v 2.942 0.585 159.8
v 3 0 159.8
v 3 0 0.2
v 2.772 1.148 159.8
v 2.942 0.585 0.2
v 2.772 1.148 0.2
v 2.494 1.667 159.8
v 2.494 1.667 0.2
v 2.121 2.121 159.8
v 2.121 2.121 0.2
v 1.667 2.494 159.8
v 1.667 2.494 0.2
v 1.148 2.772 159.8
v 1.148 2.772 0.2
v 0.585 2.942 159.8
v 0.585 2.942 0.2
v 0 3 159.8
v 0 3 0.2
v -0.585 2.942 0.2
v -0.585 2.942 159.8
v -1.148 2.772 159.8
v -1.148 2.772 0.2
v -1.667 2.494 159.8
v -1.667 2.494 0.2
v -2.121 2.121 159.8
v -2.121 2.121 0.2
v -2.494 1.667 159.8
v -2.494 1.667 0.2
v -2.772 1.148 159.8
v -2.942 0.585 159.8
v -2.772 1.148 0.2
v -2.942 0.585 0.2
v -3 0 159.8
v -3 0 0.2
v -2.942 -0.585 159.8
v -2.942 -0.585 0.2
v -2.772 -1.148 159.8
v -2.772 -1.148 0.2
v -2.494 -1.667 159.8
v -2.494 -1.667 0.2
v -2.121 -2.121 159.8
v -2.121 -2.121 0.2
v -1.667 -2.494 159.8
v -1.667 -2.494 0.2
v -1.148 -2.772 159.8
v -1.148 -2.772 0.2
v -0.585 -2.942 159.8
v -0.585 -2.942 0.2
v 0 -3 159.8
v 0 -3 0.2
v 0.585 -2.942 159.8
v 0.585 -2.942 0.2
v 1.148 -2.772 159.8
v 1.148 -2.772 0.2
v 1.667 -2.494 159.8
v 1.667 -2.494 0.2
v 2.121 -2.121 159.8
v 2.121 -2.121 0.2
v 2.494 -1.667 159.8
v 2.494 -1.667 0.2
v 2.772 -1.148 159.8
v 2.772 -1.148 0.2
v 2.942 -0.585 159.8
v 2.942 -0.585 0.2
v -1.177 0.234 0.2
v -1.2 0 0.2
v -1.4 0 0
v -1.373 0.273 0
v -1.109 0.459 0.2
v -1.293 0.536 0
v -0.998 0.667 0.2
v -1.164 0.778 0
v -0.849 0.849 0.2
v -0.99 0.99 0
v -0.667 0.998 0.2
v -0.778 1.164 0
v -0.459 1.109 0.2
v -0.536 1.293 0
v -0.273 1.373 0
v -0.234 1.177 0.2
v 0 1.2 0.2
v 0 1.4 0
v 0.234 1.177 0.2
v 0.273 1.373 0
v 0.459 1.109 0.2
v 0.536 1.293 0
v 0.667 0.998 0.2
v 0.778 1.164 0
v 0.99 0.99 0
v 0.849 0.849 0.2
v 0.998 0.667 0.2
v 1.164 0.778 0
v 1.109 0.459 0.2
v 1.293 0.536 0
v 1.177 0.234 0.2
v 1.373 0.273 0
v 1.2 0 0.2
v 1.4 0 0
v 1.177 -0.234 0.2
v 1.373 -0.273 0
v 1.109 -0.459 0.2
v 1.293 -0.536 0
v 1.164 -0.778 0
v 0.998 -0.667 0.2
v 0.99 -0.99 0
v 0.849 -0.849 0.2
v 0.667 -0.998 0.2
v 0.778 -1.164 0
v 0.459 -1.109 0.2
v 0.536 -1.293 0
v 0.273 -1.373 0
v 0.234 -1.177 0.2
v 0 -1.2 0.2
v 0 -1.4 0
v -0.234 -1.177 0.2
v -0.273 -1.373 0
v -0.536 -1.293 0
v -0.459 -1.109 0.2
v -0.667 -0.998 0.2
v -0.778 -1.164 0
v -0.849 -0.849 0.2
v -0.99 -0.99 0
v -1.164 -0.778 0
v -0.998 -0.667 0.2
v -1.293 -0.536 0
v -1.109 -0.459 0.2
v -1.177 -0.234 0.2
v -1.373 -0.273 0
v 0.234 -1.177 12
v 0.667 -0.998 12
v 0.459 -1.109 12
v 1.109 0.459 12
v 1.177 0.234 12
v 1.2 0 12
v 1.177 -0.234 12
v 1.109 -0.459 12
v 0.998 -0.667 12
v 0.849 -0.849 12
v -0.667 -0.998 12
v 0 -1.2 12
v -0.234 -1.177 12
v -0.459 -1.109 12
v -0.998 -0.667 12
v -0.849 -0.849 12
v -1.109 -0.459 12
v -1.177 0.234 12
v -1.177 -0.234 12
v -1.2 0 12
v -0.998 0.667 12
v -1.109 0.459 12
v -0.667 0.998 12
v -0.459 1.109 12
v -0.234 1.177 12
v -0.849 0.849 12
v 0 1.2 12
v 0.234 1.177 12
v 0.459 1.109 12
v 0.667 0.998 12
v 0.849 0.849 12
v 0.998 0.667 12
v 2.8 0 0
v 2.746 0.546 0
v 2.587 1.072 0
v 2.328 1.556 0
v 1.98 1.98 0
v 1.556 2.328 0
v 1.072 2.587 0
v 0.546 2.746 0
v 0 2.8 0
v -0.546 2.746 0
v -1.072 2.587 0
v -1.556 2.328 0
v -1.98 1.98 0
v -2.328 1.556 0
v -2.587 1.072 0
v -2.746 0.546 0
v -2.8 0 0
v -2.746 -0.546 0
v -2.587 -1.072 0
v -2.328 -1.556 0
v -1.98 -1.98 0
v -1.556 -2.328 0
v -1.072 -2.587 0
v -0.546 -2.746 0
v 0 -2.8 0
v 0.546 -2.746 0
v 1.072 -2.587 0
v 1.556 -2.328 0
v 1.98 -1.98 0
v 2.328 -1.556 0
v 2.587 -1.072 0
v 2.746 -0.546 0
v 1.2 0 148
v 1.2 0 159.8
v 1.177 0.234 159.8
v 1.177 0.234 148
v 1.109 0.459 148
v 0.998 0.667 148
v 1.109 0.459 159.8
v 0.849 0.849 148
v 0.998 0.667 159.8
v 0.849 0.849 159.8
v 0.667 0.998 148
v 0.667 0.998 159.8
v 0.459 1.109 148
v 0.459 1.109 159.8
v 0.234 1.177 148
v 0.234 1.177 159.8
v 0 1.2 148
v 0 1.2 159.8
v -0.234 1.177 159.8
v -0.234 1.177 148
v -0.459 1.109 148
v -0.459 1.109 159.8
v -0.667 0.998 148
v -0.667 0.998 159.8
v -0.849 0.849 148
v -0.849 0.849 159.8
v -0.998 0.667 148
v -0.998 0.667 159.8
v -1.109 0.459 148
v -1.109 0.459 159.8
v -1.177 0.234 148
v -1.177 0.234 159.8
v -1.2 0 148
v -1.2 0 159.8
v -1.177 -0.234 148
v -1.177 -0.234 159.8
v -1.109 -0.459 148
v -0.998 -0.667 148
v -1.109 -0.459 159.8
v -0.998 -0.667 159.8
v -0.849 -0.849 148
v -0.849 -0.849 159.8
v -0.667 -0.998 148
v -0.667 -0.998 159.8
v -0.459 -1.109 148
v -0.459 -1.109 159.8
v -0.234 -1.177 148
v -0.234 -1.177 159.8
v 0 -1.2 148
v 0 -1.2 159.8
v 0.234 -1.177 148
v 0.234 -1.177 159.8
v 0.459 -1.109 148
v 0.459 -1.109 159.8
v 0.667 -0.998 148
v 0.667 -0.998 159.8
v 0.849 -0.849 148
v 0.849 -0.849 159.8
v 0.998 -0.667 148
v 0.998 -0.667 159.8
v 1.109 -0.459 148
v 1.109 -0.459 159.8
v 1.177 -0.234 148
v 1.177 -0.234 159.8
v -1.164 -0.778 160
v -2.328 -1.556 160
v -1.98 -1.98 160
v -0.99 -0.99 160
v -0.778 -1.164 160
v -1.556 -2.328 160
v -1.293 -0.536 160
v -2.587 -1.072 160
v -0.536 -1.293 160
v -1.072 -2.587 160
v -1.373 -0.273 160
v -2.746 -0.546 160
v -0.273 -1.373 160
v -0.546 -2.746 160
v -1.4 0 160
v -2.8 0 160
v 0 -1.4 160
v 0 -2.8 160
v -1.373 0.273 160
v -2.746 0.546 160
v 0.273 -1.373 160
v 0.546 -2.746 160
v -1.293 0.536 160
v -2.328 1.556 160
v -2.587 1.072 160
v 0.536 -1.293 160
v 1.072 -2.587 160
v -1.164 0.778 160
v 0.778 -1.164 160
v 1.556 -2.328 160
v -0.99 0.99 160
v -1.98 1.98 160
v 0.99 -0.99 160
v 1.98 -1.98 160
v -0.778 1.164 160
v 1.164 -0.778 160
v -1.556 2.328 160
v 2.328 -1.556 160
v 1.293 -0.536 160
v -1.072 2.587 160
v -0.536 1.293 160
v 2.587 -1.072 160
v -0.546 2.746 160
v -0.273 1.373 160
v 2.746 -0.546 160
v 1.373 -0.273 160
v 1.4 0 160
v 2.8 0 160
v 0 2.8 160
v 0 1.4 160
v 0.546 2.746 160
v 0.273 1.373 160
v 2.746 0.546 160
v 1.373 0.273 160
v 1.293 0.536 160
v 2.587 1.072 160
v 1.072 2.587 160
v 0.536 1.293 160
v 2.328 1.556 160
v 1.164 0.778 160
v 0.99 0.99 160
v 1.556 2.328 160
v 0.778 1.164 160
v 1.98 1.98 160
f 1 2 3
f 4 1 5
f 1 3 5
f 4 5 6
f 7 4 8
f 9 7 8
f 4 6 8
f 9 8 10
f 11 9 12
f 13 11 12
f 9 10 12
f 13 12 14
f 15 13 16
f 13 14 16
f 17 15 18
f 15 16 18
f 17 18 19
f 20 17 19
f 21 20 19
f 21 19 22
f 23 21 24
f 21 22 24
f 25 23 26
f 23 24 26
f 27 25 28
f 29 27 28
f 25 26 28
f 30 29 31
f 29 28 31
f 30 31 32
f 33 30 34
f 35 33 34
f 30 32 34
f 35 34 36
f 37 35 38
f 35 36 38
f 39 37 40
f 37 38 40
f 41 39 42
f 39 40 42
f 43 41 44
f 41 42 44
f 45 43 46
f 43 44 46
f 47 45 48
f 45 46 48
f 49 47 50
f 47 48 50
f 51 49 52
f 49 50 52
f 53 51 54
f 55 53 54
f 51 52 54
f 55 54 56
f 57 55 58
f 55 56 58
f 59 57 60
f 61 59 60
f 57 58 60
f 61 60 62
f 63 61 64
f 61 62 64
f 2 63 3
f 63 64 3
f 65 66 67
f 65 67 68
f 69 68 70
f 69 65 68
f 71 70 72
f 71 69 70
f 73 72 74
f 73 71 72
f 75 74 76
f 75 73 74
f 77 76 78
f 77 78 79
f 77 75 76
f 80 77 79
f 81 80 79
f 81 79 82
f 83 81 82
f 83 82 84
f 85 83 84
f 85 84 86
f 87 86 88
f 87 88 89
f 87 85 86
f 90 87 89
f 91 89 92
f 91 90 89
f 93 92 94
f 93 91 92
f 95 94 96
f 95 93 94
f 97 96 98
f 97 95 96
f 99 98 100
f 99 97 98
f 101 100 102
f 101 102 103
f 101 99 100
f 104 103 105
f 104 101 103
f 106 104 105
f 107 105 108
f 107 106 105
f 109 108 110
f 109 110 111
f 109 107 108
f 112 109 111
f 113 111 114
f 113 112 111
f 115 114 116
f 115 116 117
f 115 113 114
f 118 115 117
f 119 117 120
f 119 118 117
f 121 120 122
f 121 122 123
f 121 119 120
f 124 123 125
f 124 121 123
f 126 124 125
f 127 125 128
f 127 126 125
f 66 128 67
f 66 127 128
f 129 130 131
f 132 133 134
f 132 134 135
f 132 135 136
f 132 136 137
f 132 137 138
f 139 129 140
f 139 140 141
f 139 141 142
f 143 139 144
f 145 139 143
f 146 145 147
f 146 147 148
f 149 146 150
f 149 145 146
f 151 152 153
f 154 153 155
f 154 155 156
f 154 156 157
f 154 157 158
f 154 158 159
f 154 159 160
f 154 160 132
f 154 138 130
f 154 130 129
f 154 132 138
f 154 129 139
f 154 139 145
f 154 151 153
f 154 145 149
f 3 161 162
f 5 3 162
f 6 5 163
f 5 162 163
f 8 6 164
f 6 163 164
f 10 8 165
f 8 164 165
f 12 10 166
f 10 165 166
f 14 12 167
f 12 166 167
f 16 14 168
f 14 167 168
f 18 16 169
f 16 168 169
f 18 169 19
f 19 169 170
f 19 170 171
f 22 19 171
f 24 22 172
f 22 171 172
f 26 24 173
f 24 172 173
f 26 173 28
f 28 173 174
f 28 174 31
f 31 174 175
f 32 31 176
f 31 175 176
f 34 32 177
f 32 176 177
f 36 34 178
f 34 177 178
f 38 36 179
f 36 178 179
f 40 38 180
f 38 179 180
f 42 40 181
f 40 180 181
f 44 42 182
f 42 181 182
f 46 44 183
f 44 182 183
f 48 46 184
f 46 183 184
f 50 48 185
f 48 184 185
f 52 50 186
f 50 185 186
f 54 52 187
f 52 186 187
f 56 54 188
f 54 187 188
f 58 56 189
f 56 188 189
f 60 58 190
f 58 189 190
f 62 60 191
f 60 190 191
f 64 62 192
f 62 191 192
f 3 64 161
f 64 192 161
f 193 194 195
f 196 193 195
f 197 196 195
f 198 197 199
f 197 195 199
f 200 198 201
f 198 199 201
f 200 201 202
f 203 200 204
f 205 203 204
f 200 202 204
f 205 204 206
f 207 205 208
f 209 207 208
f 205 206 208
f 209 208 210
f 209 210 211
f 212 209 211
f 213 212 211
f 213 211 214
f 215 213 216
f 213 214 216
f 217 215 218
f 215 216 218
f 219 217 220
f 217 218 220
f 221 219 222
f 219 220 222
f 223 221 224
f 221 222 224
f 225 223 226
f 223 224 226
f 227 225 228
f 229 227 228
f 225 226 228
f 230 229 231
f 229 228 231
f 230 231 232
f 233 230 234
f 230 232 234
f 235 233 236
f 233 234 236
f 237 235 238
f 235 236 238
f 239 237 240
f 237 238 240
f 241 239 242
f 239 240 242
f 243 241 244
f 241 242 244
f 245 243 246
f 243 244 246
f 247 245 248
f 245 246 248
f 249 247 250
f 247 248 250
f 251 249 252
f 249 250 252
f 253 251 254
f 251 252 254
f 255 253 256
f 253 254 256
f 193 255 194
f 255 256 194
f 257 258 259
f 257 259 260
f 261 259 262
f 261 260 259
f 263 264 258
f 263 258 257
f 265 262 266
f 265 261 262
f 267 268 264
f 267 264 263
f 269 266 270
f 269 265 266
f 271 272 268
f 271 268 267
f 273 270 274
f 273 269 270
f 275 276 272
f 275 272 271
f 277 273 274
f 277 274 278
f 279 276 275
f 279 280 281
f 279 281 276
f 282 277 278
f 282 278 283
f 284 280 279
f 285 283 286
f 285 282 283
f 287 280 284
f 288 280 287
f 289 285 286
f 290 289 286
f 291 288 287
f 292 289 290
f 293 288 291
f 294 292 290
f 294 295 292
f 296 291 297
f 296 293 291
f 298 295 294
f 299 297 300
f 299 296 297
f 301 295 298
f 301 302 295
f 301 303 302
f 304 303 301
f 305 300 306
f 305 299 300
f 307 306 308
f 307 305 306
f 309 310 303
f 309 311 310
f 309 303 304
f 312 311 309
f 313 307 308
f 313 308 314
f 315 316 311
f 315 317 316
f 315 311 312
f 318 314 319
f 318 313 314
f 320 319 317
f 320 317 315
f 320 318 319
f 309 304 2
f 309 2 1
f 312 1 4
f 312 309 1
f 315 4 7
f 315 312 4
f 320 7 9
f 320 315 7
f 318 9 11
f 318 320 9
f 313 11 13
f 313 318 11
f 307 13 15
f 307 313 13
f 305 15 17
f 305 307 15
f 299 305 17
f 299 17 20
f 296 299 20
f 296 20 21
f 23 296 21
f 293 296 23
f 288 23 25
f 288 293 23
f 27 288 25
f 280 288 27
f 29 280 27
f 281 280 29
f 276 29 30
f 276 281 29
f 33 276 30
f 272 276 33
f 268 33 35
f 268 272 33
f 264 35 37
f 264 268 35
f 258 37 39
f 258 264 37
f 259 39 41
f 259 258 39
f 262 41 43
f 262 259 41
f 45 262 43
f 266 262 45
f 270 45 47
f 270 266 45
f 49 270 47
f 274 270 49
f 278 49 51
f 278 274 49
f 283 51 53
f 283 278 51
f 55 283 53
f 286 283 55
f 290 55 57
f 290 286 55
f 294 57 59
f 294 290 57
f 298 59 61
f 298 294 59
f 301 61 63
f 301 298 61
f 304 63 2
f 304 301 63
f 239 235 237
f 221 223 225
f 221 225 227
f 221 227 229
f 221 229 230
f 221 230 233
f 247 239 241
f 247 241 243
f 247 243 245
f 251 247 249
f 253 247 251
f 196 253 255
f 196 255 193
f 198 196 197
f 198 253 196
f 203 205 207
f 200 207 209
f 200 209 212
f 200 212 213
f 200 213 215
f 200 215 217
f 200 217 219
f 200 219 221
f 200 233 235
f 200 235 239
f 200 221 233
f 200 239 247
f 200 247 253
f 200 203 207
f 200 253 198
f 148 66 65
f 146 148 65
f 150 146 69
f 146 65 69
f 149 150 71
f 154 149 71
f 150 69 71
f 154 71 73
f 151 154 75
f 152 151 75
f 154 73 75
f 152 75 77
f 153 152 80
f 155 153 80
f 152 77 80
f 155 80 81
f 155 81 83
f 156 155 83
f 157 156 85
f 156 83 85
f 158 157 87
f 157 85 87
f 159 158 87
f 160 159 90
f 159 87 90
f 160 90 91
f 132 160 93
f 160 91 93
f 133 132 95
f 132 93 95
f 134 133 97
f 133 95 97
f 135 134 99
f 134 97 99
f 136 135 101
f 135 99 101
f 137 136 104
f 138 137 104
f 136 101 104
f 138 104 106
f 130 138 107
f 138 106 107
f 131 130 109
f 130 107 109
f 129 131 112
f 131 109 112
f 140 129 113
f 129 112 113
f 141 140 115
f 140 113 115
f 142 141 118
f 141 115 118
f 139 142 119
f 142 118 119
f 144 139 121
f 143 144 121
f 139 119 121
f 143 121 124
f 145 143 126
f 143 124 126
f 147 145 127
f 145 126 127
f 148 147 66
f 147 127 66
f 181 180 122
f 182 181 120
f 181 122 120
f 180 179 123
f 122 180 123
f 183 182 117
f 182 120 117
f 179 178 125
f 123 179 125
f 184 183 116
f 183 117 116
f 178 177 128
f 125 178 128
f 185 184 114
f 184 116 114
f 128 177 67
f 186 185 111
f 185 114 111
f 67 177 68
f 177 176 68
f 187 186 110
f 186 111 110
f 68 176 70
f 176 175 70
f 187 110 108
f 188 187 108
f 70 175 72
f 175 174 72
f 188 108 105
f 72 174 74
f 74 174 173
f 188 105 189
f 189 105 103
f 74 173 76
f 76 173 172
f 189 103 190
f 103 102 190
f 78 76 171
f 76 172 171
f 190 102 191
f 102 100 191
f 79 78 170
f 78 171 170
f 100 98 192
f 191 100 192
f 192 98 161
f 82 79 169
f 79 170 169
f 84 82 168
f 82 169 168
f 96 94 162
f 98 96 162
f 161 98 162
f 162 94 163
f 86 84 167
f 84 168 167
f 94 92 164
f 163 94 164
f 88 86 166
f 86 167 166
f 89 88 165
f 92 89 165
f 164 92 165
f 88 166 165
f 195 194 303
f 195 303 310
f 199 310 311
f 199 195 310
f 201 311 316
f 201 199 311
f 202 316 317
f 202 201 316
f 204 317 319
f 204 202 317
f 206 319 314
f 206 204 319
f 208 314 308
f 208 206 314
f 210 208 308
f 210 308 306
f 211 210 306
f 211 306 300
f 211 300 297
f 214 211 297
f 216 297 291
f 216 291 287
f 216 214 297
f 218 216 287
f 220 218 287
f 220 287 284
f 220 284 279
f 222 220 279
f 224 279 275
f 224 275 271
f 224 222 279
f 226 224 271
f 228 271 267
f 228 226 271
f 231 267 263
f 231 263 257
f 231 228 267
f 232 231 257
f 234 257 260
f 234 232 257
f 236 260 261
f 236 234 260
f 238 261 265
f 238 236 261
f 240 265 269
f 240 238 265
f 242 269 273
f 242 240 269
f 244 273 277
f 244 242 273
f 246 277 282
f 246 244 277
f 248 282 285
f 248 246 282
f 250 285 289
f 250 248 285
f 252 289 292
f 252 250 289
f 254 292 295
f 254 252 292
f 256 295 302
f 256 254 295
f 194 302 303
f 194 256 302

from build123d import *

# Parameters (mm, degrees)
SKETCH1_R           = 3
BOSS_EXTRUDE1_DEPTH = 160
SKETCH2_R           = 1.2
CUT_EXTRUDE1_DEPTH  = 12
SKETCH3_R           = 1.2
CUT_EXTRUDE2_DEPTH  = 12
CHAMFER1_SIZE       = 0.2


with BuildPart() as part:
    # Sketch1 → Boss-Extrude1 (new body)
    with BuildSketch(Plane.XY):
        Circle(SKETCH1_R)
    extrude(amount=BOSS_EXTRUDE1_DEPTH)

    # Sketch2 → Cut-Extrude1 (cut)
    with BuildSketch(Plane.XY.offset(160)):
        Circle(SKETCH2_R)
    extrude(amount=-CUT_EXTRUDE1_DEPTH, mode=Mode.SUBTRACT)

    # Sketch3 → Cut-Extrude2 (cut)
    with BuildSketch(Plane(origin=(0, 0, 0), x_dir=(-1, 0, 0), z_dir=(0, 0, -1))):
        Circle(SKETCH3_R)
    extrude(amount=-CUT_EXTRUDE2_DEPTH, mode=Mode.SUBTRACT)

    # Chamfer1
    chamfer1_edges = [part.edges().sort_by_distance(p)[0] for p in [
        (1.2, 0, 0),
        (-3, 0, 0),
        (-3, 0, 160),
        (-1.2, 0, 160),
    ]]
    chamfer(chamfer1_edges, length=CHAMFER1_SIZE)


solid = part.part
